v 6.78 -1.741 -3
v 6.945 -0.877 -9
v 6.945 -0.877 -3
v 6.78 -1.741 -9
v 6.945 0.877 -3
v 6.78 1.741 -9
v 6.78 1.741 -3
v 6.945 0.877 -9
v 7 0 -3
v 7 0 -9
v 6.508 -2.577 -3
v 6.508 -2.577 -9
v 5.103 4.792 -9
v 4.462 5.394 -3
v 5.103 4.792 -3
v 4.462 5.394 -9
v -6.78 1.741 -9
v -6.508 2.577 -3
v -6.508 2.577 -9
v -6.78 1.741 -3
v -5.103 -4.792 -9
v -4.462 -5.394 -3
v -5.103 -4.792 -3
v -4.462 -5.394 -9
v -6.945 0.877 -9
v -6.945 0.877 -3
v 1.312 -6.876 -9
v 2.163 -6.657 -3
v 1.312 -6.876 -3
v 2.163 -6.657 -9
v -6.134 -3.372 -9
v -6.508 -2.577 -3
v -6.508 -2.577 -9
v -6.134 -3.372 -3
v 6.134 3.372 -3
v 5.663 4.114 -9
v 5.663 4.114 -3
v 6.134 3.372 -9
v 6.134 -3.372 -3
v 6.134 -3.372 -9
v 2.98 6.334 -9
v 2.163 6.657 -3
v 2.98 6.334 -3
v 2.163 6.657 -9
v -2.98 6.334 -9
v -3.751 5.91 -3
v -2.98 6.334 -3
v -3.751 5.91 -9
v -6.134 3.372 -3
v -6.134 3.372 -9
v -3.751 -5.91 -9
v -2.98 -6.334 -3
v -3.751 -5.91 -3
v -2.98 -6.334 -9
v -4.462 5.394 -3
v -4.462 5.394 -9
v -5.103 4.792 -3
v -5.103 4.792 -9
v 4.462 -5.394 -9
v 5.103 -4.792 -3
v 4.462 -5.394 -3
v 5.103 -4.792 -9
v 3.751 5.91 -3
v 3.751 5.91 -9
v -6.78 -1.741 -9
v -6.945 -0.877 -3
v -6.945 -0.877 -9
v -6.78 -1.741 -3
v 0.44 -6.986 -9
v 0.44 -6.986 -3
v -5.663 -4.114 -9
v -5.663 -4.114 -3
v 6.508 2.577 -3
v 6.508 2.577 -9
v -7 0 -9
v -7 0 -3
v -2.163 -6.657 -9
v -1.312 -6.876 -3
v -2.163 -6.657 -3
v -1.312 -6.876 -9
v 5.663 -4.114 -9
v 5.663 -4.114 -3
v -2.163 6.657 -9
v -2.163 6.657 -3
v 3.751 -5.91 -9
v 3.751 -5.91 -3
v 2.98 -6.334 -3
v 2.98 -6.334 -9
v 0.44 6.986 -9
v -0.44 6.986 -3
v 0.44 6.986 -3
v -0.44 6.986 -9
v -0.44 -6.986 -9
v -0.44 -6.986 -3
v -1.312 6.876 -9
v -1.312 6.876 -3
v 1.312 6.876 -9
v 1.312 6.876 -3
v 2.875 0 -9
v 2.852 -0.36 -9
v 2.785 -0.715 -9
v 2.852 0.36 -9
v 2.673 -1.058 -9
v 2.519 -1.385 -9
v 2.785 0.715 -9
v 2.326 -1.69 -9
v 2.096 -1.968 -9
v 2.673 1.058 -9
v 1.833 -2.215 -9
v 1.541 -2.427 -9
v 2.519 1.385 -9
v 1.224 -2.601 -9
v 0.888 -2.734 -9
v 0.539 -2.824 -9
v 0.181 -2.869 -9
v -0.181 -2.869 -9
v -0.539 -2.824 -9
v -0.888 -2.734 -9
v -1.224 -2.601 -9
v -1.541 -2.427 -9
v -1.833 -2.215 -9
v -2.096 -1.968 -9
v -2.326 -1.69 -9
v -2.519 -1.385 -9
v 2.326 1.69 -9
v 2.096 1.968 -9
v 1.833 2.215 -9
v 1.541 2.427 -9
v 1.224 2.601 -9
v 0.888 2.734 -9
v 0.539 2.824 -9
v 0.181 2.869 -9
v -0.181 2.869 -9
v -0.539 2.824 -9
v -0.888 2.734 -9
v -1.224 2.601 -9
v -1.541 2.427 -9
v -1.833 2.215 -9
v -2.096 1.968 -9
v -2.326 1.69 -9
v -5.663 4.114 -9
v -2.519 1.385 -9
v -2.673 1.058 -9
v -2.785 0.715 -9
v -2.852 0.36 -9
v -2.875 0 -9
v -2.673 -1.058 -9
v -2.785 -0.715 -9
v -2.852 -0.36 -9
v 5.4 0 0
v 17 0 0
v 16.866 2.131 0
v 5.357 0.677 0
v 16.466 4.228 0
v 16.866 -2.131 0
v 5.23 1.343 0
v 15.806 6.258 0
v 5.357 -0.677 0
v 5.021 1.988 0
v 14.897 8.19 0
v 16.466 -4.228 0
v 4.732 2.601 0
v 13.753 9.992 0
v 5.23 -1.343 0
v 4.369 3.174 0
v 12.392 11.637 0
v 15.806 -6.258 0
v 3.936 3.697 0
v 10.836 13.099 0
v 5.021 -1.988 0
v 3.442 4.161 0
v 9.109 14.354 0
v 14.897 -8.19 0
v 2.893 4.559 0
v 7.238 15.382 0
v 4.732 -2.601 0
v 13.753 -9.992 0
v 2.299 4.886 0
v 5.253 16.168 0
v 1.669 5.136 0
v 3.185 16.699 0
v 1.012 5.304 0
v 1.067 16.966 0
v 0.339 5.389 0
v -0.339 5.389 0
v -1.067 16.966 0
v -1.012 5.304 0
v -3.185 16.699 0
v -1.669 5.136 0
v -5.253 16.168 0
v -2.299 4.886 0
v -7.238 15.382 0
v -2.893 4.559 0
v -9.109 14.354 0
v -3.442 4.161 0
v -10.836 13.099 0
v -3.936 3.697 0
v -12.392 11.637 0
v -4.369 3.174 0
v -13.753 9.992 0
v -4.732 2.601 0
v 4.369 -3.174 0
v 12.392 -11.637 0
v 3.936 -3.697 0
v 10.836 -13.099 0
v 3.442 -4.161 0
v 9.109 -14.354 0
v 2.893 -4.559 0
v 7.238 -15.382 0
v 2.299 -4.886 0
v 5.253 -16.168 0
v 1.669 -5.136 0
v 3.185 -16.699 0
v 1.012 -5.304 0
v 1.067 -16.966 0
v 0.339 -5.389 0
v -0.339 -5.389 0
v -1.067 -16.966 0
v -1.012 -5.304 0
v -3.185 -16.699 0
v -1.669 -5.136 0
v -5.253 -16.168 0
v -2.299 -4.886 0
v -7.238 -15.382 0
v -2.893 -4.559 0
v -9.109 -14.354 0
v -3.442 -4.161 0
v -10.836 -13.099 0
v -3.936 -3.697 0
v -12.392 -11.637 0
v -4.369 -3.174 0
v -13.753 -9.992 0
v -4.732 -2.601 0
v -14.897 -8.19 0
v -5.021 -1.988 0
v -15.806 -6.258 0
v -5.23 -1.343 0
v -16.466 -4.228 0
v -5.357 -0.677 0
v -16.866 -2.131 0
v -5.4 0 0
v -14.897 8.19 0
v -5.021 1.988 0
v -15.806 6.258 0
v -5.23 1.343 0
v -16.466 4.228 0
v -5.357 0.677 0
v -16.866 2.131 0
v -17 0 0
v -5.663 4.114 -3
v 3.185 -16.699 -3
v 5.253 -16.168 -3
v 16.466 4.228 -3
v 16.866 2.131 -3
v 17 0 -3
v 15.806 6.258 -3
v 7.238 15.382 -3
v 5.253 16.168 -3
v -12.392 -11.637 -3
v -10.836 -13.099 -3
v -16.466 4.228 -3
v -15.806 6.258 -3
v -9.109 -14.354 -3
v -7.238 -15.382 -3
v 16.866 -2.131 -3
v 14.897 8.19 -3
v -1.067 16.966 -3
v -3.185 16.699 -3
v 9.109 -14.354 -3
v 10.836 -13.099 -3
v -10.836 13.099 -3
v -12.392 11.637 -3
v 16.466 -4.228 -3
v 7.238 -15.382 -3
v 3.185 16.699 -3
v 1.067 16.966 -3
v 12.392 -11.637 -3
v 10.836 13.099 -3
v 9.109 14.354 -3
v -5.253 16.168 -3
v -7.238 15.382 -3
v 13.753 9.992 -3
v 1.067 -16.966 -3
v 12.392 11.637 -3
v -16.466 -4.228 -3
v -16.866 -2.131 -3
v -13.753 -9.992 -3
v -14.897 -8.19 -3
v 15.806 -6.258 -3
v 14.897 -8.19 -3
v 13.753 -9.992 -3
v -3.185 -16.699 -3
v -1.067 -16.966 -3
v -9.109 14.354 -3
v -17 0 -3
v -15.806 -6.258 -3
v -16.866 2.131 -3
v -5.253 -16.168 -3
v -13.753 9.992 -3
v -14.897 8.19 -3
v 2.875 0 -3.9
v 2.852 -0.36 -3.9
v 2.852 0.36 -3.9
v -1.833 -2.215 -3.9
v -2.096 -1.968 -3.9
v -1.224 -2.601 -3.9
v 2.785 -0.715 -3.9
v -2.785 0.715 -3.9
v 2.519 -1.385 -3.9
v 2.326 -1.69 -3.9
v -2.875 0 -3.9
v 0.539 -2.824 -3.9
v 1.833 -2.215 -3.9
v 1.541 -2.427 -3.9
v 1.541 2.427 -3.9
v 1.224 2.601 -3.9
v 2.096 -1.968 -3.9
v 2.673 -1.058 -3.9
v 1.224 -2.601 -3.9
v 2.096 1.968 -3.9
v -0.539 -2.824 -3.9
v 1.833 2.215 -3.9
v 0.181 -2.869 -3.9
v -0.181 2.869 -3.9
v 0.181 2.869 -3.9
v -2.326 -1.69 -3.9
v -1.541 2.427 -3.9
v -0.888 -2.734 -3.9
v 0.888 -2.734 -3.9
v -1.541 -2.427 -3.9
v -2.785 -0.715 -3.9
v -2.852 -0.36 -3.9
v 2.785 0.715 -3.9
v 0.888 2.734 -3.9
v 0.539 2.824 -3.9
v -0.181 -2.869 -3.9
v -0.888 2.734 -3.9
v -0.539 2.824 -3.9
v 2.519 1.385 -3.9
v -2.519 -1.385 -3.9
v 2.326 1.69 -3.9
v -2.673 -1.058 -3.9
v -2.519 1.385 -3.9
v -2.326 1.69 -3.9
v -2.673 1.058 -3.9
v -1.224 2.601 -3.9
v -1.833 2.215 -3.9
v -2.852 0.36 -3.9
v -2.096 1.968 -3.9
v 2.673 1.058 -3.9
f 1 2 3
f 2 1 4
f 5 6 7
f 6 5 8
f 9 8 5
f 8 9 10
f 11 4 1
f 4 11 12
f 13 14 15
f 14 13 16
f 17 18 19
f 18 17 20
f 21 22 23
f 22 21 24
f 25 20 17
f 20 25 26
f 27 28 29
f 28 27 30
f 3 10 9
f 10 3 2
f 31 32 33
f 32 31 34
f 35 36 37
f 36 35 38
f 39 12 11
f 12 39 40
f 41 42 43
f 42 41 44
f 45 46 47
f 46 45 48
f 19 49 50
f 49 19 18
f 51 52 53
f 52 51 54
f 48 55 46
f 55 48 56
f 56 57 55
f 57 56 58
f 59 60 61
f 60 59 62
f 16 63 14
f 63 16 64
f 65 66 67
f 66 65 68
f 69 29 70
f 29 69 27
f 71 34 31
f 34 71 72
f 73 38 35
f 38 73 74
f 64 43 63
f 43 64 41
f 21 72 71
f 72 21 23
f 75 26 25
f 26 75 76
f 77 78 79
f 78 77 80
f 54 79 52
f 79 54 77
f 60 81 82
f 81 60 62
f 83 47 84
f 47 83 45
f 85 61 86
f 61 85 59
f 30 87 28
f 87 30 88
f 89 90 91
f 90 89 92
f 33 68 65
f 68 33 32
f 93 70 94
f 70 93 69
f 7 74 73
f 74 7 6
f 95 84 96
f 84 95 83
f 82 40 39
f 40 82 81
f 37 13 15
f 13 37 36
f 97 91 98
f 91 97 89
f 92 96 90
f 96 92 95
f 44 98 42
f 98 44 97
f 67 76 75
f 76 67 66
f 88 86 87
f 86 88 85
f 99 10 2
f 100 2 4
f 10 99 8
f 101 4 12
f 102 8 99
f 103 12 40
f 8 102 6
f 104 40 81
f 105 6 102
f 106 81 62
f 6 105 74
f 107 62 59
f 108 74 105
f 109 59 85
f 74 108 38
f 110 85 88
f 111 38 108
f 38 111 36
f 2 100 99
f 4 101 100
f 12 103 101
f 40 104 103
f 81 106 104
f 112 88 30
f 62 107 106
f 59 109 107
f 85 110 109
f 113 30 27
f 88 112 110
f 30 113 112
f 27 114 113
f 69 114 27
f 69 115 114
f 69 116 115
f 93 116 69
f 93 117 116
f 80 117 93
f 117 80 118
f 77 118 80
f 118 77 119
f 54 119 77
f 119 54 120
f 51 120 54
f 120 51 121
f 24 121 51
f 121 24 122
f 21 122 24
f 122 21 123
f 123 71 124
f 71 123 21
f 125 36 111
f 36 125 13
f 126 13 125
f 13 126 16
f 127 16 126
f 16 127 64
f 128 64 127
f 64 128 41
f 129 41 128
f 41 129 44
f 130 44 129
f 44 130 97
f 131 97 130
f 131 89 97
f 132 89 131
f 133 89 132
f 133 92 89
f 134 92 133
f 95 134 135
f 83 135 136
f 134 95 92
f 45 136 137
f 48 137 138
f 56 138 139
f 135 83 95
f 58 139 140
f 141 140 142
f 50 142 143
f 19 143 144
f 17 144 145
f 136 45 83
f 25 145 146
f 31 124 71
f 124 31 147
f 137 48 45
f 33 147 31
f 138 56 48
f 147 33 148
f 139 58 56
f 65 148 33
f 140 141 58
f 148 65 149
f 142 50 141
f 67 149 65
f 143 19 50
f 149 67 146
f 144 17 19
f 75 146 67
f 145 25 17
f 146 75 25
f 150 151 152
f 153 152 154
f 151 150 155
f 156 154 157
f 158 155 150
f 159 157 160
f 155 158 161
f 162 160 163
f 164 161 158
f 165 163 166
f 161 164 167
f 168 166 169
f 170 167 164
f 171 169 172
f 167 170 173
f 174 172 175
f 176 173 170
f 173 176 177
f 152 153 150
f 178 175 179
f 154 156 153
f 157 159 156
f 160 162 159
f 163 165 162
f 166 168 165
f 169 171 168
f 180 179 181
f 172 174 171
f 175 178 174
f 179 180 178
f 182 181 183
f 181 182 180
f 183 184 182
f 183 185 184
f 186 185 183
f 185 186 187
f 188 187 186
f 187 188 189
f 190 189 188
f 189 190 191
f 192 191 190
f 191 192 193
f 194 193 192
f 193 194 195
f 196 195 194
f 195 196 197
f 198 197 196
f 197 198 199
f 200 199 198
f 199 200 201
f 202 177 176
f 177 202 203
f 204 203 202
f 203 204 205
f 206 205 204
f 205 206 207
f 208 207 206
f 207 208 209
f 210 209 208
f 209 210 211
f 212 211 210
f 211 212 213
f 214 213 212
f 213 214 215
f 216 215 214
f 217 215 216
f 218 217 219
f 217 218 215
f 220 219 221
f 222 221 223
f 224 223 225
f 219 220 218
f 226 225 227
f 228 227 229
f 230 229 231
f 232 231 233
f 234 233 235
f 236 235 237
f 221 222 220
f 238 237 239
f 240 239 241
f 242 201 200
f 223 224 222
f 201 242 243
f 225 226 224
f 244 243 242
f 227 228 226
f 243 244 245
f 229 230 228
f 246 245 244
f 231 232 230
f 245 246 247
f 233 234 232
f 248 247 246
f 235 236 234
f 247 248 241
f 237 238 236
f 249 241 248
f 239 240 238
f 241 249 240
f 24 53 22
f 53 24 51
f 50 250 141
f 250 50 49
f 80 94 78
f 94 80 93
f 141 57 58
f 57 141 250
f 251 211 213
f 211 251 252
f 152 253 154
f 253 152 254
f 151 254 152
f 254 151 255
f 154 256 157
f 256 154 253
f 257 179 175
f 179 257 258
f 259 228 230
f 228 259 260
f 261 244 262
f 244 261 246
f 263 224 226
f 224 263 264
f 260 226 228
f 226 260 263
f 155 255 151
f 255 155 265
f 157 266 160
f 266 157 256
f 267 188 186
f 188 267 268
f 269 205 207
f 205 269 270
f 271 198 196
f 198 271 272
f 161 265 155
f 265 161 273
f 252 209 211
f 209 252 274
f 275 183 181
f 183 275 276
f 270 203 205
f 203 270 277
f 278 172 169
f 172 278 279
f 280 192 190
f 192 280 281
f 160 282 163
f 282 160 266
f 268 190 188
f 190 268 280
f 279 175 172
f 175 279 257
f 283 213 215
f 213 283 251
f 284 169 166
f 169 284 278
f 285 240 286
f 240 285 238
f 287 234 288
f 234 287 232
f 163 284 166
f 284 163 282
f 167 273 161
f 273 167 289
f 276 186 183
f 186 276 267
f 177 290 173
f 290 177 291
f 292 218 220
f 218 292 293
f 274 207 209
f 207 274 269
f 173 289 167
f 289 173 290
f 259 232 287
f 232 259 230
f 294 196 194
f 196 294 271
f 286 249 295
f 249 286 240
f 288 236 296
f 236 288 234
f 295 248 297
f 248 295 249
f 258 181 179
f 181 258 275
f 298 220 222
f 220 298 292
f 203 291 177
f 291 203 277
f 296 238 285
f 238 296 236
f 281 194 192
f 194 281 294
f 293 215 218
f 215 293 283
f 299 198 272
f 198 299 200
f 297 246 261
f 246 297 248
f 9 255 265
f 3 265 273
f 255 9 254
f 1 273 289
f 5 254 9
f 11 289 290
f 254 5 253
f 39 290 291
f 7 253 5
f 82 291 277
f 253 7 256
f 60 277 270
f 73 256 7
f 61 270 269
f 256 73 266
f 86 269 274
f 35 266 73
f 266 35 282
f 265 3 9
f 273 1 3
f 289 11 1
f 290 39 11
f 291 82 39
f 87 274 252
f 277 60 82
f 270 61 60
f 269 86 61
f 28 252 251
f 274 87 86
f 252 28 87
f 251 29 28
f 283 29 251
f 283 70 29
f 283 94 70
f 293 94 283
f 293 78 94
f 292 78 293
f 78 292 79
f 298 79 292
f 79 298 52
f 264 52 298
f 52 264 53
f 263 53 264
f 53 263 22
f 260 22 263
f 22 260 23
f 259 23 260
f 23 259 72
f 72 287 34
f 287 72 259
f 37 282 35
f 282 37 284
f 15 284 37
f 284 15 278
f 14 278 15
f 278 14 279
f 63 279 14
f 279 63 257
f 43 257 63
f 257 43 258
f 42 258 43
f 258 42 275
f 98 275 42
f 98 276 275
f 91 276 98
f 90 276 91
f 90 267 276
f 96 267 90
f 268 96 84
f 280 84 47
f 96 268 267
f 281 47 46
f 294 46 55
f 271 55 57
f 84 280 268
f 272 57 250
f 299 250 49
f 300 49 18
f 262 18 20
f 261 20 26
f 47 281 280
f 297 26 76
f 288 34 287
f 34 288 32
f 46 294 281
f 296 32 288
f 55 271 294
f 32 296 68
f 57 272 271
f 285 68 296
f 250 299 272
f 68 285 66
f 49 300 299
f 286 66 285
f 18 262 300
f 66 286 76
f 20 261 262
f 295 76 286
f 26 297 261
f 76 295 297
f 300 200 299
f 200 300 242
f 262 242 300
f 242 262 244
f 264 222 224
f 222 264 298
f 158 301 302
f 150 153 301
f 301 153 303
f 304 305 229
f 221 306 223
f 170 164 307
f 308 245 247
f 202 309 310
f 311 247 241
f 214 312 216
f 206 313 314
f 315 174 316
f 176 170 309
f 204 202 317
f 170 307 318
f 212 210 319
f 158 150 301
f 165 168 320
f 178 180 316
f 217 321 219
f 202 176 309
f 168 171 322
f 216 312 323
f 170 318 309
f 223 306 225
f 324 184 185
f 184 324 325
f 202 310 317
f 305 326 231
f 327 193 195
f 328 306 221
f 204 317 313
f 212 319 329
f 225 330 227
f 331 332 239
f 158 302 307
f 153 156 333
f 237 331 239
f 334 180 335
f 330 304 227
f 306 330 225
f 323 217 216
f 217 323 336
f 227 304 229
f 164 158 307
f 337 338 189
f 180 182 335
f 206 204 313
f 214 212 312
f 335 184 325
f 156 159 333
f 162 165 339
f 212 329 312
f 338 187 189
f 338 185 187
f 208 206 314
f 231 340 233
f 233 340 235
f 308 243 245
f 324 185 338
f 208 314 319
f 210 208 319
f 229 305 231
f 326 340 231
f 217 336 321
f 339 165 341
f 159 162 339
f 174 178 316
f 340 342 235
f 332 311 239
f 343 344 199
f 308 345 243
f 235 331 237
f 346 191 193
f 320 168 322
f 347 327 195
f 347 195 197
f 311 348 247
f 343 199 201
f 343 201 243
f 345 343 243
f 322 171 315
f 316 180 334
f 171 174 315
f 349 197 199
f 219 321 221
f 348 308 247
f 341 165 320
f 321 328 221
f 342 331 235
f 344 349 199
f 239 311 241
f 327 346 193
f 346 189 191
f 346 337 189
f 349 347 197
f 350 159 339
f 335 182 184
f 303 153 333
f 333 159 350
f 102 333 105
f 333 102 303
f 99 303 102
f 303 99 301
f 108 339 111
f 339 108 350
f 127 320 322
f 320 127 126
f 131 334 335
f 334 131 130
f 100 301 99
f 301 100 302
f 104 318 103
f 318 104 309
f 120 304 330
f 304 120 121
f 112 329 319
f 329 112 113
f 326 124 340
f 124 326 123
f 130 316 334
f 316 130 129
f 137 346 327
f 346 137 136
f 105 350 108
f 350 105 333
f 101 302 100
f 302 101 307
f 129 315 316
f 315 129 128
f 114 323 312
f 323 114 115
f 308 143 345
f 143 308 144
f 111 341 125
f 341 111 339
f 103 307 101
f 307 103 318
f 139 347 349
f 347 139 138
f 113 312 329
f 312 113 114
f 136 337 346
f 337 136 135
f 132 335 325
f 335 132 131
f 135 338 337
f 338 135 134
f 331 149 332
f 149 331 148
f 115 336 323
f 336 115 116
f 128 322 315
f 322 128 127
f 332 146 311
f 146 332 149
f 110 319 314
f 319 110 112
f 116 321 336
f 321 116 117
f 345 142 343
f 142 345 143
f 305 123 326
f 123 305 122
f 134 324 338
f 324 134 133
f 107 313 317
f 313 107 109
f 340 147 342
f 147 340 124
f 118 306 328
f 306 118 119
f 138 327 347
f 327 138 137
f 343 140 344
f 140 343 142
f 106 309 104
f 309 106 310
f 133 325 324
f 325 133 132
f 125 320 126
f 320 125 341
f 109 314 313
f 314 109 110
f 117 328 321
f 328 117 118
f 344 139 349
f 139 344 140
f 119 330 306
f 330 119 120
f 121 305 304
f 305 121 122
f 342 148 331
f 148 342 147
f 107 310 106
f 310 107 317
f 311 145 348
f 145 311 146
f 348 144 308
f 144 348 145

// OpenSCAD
$fn = 50;


difference() {
	union() {
		translate(v = [0, 0, -9.0000000000]) {
			cylinder(h = 9, r = 7.0000000000);
		}
		translate(v = [0, 0, -3.0000000000]) {
			cylinder(h = 3, r = 17.0000000000);
		}
	}
	union() {
		translate(v = [0, 0, 0]) {
			rotate(a = [0, 0, 0]) {
				difference() {
					union() {
						#translate(v = [0, 0, -9.0000000000]) {
							cylinder(h = 9, r = 2.6000000000);
						}
						#translate(v = [0, 0, -3.9000000000]) {
							cylinder(h = 3.9000000000, r = 7.0000000000, r1 = 2.8750000000, r2 = 5.4000000000);
						}
						#translate(v = [0, 0, -9.0000000000]) {
							cylinder(h = 9, r = 2.8750000000);
						}
						#translate(v = [0, 0, -9.0000000000]) {
							cylinder(h = 9, r = 2.6000000000);
						}
					}
					union();
				}
			}
		}
	}
}
